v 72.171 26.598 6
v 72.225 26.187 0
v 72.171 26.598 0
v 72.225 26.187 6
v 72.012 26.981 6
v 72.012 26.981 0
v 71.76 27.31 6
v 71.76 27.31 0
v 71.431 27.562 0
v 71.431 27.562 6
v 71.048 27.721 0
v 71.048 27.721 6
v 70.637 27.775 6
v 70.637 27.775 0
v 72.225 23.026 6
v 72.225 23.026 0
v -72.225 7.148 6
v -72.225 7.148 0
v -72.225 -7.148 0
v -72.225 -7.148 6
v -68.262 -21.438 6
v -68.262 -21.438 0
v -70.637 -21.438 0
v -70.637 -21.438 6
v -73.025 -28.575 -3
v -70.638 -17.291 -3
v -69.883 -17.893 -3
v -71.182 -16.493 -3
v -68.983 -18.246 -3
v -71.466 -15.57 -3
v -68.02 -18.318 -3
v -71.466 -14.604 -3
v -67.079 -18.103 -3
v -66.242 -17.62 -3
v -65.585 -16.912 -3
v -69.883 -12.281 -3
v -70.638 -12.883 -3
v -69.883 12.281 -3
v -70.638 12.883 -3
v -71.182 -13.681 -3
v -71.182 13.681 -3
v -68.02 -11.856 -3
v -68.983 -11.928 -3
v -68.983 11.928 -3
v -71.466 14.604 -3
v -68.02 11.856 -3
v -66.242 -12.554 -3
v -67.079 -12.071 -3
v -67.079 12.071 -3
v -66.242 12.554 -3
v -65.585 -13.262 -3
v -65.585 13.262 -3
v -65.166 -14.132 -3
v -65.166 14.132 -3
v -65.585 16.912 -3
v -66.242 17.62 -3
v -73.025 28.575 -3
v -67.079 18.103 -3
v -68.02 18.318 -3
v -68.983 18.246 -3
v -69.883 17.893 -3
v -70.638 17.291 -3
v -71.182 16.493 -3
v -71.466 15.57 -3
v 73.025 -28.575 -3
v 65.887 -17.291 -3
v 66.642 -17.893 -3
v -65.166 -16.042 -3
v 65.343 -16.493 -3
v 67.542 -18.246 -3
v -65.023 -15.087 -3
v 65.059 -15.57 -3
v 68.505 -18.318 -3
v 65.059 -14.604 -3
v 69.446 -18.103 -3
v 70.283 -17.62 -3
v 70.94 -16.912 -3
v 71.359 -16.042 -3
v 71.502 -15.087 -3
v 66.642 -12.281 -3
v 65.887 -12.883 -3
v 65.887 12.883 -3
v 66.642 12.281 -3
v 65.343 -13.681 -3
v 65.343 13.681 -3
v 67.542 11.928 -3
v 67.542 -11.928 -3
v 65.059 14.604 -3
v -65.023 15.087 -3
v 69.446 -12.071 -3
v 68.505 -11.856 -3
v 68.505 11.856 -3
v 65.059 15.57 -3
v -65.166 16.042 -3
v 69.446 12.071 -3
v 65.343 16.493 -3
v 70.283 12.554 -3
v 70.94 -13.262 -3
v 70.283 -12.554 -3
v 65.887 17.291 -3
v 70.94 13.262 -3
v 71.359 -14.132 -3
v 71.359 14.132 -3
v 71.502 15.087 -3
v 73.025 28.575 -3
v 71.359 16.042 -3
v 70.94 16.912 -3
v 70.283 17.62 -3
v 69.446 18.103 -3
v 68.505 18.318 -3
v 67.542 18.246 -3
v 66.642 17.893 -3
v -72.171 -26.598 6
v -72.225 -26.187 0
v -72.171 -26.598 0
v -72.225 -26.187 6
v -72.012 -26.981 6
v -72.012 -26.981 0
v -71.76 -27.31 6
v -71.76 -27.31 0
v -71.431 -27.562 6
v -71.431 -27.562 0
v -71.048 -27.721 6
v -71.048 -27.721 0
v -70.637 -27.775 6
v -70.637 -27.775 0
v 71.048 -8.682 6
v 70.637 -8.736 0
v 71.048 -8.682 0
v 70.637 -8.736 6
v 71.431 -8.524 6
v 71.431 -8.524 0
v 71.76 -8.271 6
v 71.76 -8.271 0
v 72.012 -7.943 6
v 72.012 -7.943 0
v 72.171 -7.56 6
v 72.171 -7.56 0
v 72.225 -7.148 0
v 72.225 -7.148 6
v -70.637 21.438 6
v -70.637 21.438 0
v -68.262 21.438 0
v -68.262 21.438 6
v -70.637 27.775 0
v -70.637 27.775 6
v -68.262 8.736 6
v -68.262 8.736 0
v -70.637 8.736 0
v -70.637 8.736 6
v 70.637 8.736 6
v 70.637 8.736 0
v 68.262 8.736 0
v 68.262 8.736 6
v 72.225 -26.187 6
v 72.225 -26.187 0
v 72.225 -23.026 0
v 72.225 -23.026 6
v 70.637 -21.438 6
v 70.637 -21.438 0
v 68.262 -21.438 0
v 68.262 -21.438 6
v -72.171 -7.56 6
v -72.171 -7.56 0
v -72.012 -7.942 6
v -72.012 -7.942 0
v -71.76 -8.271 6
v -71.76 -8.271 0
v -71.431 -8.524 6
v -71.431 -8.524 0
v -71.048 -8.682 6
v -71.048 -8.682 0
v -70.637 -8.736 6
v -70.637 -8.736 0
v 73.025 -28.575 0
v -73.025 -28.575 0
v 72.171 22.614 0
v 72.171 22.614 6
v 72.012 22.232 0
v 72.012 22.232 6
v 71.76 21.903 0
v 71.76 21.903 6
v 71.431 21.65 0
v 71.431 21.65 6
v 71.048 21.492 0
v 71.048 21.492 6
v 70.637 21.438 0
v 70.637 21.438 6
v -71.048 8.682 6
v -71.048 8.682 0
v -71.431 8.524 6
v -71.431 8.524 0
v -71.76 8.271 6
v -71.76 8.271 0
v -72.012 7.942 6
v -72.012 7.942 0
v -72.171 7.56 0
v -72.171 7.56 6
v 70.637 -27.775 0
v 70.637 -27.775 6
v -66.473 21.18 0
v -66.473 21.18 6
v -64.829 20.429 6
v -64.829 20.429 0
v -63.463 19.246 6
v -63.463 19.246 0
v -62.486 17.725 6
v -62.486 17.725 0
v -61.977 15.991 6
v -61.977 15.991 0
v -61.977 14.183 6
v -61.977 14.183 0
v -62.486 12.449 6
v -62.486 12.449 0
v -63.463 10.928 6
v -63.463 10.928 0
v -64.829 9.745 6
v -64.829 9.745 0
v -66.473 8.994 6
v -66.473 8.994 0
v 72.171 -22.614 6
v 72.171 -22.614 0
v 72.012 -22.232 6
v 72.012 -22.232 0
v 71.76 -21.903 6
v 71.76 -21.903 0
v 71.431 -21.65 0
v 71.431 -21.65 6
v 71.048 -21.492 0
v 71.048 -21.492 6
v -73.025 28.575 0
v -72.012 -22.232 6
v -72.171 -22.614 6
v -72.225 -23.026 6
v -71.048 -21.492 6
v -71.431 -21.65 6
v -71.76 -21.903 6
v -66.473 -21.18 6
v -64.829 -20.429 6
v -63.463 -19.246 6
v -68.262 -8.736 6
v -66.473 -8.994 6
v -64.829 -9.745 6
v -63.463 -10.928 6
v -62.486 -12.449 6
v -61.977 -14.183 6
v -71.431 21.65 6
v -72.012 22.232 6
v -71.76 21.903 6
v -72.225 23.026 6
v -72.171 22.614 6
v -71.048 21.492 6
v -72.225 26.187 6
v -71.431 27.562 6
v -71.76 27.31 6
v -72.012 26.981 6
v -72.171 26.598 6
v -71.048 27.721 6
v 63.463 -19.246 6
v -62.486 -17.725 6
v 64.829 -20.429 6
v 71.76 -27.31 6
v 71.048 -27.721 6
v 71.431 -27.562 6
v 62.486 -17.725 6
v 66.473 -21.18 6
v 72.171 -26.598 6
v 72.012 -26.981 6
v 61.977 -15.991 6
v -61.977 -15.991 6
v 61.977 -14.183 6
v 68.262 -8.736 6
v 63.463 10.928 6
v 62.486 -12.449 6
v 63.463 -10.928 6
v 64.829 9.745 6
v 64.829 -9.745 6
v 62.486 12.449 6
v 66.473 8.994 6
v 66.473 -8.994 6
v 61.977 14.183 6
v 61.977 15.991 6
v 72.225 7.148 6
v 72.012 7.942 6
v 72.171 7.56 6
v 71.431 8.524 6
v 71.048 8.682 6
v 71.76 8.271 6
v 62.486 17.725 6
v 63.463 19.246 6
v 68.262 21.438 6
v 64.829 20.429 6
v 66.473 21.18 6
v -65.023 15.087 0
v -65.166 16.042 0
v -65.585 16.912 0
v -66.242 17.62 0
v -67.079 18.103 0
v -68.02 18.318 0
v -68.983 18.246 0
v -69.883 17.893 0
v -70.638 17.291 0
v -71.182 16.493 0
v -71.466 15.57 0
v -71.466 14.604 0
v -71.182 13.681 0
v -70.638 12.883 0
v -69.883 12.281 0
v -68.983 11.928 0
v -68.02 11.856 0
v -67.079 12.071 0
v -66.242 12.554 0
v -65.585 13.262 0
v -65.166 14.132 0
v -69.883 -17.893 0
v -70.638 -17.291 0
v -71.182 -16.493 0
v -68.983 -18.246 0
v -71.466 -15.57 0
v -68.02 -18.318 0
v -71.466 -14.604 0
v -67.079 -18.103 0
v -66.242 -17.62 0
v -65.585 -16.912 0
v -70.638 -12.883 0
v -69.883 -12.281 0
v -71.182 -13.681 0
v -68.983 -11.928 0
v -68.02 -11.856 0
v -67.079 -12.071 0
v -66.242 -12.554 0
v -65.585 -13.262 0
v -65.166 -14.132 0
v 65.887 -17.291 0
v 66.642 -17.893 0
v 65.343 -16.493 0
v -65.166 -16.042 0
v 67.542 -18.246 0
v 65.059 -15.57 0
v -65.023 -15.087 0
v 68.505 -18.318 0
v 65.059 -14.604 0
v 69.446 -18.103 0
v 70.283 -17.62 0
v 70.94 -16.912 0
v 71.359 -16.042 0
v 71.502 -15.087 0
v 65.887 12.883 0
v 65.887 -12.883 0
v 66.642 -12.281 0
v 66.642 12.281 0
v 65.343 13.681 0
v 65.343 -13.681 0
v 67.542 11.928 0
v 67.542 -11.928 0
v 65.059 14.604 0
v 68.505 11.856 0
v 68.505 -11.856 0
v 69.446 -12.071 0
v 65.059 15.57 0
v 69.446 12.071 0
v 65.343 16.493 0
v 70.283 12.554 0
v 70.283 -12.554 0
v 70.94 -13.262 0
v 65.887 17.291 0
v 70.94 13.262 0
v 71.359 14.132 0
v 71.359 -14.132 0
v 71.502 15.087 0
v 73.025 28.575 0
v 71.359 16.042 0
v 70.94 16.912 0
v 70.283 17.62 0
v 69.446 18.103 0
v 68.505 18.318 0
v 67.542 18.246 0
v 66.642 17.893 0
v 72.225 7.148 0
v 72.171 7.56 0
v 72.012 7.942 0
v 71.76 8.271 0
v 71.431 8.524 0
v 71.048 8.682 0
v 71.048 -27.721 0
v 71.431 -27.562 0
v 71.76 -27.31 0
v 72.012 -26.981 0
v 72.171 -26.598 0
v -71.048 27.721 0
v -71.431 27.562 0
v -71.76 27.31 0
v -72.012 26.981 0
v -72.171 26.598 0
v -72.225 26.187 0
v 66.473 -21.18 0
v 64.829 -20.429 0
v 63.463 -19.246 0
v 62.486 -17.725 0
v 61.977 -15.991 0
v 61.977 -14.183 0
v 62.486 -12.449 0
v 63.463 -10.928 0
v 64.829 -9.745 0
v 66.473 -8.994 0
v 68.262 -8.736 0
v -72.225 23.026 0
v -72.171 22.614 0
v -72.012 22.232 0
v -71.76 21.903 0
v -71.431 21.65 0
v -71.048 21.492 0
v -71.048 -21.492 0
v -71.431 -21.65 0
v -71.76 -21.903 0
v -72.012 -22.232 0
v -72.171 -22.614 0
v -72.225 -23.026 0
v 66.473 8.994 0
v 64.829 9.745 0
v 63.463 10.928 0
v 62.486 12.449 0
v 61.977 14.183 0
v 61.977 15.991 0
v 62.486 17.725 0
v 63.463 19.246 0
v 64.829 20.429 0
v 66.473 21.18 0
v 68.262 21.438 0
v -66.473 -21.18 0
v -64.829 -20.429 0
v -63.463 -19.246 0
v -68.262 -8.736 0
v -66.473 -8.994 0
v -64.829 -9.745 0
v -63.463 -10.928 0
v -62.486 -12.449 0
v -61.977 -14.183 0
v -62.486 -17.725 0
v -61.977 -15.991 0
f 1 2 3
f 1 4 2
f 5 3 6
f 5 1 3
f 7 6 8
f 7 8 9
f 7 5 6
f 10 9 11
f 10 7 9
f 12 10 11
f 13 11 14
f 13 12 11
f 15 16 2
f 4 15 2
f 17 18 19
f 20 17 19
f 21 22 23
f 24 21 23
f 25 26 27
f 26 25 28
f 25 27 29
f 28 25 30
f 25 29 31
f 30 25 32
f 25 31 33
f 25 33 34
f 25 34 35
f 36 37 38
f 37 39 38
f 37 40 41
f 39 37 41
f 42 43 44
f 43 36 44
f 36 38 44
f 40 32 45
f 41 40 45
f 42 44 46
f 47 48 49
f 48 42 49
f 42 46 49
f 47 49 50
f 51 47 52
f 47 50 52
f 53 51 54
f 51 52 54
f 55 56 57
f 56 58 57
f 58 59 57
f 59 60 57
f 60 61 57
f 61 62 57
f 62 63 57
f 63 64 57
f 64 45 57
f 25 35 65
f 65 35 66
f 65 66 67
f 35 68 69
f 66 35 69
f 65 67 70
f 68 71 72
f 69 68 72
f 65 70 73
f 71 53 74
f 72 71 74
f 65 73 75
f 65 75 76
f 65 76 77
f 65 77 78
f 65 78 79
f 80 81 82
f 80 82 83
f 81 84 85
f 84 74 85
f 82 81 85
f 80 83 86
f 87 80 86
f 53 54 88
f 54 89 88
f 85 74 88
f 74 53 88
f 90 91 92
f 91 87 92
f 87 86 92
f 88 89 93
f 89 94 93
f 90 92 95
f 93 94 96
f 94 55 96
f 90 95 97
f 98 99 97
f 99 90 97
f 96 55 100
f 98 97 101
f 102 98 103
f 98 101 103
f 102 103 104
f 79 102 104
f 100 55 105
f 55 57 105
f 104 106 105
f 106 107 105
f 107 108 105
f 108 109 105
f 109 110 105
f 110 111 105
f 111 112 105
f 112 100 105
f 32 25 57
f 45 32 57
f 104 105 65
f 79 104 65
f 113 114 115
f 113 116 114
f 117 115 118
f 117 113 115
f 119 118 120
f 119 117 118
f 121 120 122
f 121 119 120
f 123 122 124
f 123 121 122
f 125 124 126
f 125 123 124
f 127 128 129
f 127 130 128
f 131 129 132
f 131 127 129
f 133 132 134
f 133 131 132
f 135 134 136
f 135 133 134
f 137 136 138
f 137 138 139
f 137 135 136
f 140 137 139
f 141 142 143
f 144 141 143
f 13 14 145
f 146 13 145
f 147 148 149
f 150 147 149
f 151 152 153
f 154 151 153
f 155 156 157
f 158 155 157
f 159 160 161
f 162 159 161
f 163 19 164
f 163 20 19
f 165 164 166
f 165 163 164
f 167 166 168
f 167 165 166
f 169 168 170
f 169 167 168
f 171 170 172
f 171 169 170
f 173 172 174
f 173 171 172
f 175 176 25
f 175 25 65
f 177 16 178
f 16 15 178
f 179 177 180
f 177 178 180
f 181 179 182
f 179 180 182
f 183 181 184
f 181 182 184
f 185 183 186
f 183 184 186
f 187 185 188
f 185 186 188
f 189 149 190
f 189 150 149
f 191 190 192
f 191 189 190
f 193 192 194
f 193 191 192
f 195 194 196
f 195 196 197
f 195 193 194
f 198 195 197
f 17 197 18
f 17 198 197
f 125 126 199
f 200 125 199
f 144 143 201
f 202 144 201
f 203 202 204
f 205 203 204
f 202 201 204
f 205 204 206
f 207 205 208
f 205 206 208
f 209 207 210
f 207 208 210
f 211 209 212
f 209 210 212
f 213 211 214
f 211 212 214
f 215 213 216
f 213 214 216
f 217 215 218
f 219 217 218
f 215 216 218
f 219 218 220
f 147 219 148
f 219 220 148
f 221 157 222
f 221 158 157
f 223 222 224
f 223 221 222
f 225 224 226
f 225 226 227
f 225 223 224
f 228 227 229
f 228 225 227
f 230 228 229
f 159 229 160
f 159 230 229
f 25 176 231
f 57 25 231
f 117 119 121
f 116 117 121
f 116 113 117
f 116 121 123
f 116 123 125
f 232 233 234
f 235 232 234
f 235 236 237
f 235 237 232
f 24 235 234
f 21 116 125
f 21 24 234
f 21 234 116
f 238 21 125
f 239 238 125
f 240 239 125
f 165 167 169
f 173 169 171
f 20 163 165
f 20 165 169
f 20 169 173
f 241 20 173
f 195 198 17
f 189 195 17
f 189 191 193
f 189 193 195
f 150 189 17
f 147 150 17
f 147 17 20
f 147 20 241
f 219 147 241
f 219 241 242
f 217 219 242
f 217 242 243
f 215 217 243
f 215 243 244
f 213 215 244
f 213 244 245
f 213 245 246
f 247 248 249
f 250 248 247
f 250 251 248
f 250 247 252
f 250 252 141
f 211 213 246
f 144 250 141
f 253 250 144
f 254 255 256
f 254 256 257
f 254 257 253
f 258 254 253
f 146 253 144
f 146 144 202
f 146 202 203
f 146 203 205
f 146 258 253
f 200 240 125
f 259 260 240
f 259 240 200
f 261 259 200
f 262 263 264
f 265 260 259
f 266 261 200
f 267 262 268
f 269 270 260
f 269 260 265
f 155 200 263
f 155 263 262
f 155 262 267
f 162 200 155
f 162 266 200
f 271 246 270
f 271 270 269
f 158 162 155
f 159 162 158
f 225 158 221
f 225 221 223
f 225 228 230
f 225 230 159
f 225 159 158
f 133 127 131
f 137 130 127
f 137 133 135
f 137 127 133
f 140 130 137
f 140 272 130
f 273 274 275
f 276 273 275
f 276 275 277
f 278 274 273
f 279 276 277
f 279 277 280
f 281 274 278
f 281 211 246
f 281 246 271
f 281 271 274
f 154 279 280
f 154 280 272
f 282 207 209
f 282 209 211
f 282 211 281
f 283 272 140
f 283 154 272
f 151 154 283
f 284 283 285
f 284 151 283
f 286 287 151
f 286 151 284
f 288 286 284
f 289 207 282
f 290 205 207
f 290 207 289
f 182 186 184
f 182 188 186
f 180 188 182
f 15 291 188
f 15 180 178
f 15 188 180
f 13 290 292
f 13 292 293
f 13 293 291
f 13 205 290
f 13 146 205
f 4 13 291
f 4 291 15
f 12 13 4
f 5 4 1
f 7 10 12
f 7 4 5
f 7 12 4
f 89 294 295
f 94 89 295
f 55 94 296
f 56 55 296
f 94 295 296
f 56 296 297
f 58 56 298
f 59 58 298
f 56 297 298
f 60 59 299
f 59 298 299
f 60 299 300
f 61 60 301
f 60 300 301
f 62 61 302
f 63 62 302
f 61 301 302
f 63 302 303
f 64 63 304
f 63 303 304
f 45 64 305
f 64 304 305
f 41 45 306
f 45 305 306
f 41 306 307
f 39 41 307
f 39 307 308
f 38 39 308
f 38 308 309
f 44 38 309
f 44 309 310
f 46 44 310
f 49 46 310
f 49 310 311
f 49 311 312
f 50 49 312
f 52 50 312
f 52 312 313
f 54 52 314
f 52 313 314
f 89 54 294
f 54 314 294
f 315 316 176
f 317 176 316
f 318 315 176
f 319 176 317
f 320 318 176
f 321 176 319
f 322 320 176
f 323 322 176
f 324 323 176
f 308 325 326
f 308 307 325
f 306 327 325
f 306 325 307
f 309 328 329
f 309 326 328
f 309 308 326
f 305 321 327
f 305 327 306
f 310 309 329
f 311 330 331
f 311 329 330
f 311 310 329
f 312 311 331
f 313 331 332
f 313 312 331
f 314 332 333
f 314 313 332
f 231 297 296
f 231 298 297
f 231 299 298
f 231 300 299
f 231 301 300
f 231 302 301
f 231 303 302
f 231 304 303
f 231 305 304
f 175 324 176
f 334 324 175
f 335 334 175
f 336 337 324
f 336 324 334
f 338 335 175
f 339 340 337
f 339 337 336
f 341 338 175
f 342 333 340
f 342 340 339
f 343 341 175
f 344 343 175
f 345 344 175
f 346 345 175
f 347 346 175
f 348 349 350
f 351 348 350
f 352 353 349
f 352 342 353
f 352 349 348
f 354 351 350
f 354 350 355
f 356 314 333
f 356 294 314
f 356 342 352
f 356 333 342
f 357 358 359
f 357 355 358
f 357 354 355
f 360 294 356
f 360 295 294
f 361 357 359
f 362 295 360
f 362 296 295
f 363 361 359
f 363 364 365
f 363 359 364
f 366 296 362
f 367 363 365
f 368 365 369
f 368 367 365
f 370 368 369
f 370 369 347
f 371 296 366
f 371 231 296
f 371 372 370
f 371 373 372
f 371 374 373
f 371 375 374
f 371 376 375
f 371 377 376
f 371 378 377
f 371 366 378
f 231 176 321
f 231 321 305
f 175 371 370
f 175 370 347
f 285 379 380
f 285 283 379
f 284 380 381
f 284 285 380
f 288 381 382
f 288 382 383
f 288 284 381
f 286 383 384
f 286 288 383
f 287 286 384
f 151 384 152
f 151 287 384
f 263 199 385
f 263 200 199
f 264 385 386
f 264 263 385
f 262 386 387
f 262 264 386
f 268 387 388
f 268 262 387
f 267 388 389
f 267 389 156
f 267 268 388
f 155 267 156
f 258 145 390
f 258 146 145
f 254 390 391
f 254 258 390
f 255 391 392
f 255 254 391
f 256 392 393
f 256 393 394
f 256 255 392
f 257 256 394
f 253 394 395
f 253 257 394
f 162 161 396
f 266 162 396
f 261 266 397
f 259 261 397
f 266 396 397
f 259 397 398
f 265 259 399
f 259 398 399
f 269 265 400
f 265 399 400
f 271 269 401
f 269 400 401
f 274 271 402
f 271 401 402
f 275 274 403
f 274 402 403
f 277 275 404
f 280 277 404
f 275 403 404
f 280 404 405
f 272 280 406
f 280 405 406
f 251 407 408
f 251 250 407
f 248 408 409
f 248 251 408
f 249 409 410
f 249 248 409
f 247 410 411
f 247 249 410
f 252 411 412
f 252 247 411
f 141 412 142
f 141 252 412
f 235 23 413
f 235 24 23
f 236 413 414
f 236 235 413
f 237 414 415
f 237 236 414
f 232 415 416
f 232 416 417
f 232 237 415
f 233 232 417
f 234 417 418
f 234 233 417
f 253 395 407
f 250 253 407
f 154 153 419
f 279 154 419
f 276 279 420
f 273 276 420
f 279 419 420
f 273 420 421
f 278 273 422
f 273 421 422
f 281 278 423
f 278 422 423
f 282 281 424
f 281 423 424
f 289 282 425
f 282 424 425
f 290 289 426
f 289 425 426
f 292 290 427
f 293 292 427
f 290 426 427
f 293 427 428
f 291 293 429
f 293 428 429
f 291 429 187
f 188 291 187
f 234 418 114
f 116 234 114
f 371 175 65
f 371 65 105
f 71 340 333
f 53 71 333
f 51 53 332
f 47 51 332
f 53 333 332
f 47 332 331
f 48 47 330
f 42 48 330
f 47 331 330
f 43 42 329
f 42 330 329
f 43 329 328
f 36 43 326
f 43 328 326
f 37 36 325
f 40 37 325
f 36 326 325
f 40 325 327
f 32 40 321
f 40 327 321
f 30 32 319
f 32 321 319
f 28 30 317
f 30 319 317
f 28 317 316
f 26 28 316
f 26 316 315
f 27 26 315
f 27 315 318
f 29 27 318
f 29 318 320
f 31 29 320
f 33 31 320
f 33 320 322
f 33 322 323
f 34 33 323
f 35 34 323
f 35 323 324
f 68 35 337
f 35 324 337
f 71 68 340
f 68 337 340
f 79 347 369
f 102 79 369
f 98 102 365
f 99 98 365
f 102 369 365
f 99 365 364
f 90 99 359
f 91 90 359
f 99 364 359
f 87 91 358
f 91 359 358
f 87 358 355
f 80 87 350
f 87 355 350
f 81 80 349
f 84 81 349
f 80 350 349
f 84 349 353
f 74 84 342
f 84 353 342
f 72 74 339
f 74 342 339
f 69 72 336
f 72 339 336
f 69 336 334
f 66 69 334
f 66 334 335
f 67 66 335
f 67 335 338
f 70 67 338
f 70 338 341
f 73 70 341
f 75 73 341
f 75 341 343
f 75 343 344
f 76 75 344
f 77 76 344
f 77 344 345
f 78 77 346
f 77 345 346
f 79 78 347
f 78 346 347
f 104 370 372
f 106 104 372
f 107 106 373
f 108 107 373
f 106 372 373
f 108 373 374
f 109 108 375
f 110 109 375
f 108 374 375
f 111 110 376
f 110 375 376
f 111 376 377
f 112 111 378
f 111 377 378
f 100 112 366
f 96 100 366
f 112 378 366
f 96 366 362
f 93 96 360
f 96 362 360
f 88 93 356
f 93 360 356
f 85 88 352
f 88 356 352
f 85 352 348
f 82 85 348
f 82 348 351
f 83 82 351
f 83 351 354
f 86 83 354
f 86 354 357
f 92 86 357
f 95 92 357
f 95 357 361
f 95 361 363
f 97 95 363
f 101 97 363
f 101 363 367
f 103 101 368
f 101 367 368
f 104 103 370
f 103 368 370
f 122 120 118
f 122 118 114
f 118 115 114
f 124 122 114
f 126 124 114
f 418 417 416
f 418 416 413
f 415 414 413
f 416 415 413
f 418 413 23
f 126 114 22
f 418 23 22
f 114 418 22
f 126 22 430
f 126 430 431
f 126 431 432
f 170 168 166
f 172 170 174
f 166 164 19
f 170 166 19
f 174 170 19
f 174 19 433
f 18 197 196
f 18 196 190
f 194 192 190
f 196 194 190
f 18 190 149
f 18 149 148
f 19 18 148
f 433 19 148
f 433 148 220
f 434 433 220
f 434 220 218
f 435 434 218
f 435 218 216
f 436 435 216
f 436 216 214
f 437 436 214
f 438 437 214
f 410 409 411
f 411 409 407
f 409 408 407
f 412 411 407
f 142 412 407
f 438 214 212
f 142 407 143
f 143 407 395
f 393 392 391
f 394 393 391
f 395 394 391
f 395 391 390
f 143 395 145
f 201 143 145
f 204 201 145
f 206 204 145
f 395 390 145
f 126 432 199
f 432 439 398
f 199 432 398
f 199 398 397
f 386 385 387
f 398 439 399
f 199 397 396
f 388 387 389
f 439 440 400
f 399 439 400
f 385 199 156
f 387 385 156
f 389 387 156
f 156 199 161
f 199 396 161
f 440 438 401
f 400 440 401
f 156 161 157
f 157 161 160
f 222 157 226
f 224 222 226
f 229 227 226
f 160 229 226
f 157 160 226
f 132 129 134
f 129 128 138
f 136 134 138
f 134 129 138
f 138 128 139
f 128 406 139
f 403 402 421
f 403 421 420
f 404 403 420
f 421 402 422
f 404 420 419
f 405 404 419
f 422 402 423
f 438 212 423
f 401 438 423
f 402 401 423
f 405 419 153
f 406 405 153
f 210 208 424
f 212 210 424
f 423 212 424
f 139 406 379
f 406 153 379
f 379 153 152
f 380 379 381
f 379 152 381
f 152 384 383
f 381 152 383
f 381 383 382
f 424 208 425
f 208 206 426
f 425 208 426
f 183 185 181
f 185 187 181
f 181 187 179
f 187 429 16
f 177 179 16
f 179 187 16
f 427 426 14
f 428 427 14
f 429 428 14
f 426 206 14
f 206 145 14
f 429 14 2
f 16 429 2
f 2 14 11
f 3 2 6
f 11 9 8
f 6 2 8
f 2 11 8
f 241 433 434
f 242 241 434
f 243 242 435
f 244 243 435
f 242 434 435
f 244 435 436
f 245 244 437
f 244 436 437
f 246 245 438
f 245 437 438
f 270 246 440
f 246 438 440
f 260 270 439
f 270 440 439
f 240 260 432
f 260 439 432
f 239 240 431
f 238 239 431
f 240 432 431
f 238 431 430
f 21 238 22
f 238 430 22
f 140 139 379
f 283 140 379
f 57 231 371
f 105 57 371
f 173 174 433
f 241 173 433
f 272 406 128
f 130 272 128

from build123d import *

# Parameters (mm, degrees)
F0_W     = 146.05
F0_H     = 57.15
F0_R     = 3.24
F1_DEPTH = 3
F2_DEPTH = 6
F3_R     = 1.588


with BuildPart() as f1:
    # F0 (on Top) → F1 (new body)
    with BuildSketch(Plane.XY):
        Rectangle(F0_W, F0_H)
        with Locations((-68.2625, -15.087)):
            Circle(F0_R, mode=Mode.SUBTRACT)
        with Locations((68.2625, -15.087)):
            Circle(F0_R, mode=Mode.SUBTRACT)
        with Locations((-68.2625, 15.087)):
            Circle(F0_R, mode=Mode.SUBTRACT)
        with BuildLine():
            Line((-72.225, 27.775), (72.225, 27.775))
            Line((72.225, 27.775), (72.225, 21.4375))
            Line((72.225, 21.4375), (68.2625, 21.4375))
            ThreePointArc((68.2625, 21.4375), (61.912, 15.087), (68.2625, 8.7365))
            Line((68.2625, 8.7365), (72.225, 8.7365))
            Line((72.225, 8.7365), (72.225, -8.7365))
            Line((72.225, -8.7365), (68.2625, -8.7365))
            ThreePointArc((68.2625, -8.7365), (61.912, -15.087), (68.2625, -21.4375))
            Line((68.2625, -21.4375), (72.225, -21.4375))
            Line((72.225, -21.4375), (72.225, -27.775))
            Line((72.225, -27.775), (-72.225, -27.775))
            Line((-72.225, -27.775), (-72.225, -21.4375))
            Line((-72.225, -21.4375), (-68.2625, -21.4375))
            ThreePointArc((-68.2625, -21.4375), (-61.912, -15.087), (-68.2625, -8.7365))
            Line((-68.2625, -8.7365), (-72.225, -8.7365))
            Line((-72.225, -8.7365), (-72.225, 8.7365))
            Line((-72.225, 8.7365), (-68.2625, 8.7365))
            ThreePointArc((-68.2625, 8.7365), (-61.912, 15.087), (-68.2625, 21.4375))
            Line((-68.2625, 21.4375), (-72.225, 21.4375))
            Line((-72.225, 21.4375), (-72.225, 27.775))
        make_face(mode=Mode.SUBTRACT)
        with Locations((68.2625, 15.087)):
            Circle(F0_R, mode=Mode.SUBTRACT)
        with BuildLine():
            Line((72.225, 21.4375), (72.225, 27.775))
            Line((72.225, 27.775), (-72.225, 27.775))
            Line((-72.225, 27.775), (-72.225, 21.4375))
            Line((-72.225, 21.4375), (-68.2625, 21.4375))
            ThreePointArc((-68.2625, 21.4375), (-61.912, 15.087), (-68.2625, 8.7365))
            Line((-68.2625, 8.7365), (-72.225, 8.7365))
            Line((-72.225, 8.7365), (-72.225, -8.7365))
            Line((-72.225, -8.7365), (-68.2625, -8.7365))
            ThreePointArc((-68.2625, -8.7365), (-61.912, -15.087), (-68.2625, -21.4375))
            Line((-68.2625, -21.4375), (-72.225, -21.4375))
            Line((-72.225, -21.4375), (-72.225, -27.775))
            Line((-72.225, -27.775), (72.225, -27.775))
            Line((72.225, -27.775), (72.225, -21.4375))
            Line((72.225, -21.4375), (68.2625, -21.4375))
            ThreePointArc((68.2625, -21.4375), (61.912, -15.087), (68.2625, -8.7365))
            Line((68.2625, -8.7365), (72.225, -8.7365))
            Line((72.225, -8.7365), (72.225, 8.7365))
            Line((72.225, 8.7365), (68.2625, 8.7365))
            ThreePointArc((68.2625, 8.7365), (61.912, 15.087), (68.2625, 21.4375))
            Line((68.2625, 21.4375), (72.225, 21.4375))
        make_face()
    extrude(amount=-F1_DEPTH)


with BuildPart() as f2:
    # F0 (on Top) → F2 (new body)
    with BuildSketch(Plane.XY):
        with BuildLine():
            Line((72.225, 21.4375), (72.225, 27.775))
            Line((72.225, 27.775), (-72.225, 27.775))
            Line((-72.225, 27.775), (-72.225, 21.4375))
            Line((-72.225, 21.4375), (-68.2625, 21.4375))
            ThreePointArc((-68.2625, 21.4375), (-61.912, 15.087), (-68.2625, 8.7365))
            Line((-68.2625, 8.7365), (-72.225, 8.7365))
            Line((-72.225, 8.7365), (-72.225, -8.7365))
            Line((-72.225, -8.7365), (-68.2625, -8.7365))
            ThreePointArc((-68.2625, -8.7365), (-61.912, -15.087), (-68.2625, -21.4375))
            Line((-68.2625, -21.4375), (-72.225, -21.4375))
            Line((-72.225, -21.4375), (-72.225, -27.775))
            Line((-72.225, -27.775), (72.225, -27.775))
            Line((72.225, -27.775), (72.225, -21.4375))
            Line((72.225, -21.4375), (68.2625, -21.4375))
            ThreePointArc((68.2625, -21.4375), (61.912, -15.087), (68.2625, -8.7365))
            Line((68.2625, -8.7365), (72.225, -8.7365))
            Line((72.225, -8.7365), (72.225, 8.7365))
            Line((72.225, 8.7365), (68.2625, 8.7365))
            ThreePointArc((68.2625, 8.7365), (61.912, 15.087), (68.2625, 21.4375))
            Line((68.2625, 21.4375), (72.225, 21.4375))
        make_face()
    extrude(amount=F2_DEPTH)

    # F3
    f3_edges = [f2.edges().sort_by_distance(p)[0] for p in [
        (-72.225, 27.775, 3),
        (-72.225, 21.4375, 3),
        (-72.225, 8.7365, 3),
        (-72.225, -8.7365, 3),
        (-72.225, -21.4375, 3),
        (-72.225, -27.775, 3),
        (72.225, 21.4375, 3),
        (72.225, -8.7365, 3),
        (72.225, -27.775, 3),
        (72.225, -21.4375, 3),
        (72.225, 8.7365, 3),
        (72.225, 27.775, 3),
    ]]
    fillet(f3_edges, radius=F3_R)


solid = Compound([f1.part, f2.part])
